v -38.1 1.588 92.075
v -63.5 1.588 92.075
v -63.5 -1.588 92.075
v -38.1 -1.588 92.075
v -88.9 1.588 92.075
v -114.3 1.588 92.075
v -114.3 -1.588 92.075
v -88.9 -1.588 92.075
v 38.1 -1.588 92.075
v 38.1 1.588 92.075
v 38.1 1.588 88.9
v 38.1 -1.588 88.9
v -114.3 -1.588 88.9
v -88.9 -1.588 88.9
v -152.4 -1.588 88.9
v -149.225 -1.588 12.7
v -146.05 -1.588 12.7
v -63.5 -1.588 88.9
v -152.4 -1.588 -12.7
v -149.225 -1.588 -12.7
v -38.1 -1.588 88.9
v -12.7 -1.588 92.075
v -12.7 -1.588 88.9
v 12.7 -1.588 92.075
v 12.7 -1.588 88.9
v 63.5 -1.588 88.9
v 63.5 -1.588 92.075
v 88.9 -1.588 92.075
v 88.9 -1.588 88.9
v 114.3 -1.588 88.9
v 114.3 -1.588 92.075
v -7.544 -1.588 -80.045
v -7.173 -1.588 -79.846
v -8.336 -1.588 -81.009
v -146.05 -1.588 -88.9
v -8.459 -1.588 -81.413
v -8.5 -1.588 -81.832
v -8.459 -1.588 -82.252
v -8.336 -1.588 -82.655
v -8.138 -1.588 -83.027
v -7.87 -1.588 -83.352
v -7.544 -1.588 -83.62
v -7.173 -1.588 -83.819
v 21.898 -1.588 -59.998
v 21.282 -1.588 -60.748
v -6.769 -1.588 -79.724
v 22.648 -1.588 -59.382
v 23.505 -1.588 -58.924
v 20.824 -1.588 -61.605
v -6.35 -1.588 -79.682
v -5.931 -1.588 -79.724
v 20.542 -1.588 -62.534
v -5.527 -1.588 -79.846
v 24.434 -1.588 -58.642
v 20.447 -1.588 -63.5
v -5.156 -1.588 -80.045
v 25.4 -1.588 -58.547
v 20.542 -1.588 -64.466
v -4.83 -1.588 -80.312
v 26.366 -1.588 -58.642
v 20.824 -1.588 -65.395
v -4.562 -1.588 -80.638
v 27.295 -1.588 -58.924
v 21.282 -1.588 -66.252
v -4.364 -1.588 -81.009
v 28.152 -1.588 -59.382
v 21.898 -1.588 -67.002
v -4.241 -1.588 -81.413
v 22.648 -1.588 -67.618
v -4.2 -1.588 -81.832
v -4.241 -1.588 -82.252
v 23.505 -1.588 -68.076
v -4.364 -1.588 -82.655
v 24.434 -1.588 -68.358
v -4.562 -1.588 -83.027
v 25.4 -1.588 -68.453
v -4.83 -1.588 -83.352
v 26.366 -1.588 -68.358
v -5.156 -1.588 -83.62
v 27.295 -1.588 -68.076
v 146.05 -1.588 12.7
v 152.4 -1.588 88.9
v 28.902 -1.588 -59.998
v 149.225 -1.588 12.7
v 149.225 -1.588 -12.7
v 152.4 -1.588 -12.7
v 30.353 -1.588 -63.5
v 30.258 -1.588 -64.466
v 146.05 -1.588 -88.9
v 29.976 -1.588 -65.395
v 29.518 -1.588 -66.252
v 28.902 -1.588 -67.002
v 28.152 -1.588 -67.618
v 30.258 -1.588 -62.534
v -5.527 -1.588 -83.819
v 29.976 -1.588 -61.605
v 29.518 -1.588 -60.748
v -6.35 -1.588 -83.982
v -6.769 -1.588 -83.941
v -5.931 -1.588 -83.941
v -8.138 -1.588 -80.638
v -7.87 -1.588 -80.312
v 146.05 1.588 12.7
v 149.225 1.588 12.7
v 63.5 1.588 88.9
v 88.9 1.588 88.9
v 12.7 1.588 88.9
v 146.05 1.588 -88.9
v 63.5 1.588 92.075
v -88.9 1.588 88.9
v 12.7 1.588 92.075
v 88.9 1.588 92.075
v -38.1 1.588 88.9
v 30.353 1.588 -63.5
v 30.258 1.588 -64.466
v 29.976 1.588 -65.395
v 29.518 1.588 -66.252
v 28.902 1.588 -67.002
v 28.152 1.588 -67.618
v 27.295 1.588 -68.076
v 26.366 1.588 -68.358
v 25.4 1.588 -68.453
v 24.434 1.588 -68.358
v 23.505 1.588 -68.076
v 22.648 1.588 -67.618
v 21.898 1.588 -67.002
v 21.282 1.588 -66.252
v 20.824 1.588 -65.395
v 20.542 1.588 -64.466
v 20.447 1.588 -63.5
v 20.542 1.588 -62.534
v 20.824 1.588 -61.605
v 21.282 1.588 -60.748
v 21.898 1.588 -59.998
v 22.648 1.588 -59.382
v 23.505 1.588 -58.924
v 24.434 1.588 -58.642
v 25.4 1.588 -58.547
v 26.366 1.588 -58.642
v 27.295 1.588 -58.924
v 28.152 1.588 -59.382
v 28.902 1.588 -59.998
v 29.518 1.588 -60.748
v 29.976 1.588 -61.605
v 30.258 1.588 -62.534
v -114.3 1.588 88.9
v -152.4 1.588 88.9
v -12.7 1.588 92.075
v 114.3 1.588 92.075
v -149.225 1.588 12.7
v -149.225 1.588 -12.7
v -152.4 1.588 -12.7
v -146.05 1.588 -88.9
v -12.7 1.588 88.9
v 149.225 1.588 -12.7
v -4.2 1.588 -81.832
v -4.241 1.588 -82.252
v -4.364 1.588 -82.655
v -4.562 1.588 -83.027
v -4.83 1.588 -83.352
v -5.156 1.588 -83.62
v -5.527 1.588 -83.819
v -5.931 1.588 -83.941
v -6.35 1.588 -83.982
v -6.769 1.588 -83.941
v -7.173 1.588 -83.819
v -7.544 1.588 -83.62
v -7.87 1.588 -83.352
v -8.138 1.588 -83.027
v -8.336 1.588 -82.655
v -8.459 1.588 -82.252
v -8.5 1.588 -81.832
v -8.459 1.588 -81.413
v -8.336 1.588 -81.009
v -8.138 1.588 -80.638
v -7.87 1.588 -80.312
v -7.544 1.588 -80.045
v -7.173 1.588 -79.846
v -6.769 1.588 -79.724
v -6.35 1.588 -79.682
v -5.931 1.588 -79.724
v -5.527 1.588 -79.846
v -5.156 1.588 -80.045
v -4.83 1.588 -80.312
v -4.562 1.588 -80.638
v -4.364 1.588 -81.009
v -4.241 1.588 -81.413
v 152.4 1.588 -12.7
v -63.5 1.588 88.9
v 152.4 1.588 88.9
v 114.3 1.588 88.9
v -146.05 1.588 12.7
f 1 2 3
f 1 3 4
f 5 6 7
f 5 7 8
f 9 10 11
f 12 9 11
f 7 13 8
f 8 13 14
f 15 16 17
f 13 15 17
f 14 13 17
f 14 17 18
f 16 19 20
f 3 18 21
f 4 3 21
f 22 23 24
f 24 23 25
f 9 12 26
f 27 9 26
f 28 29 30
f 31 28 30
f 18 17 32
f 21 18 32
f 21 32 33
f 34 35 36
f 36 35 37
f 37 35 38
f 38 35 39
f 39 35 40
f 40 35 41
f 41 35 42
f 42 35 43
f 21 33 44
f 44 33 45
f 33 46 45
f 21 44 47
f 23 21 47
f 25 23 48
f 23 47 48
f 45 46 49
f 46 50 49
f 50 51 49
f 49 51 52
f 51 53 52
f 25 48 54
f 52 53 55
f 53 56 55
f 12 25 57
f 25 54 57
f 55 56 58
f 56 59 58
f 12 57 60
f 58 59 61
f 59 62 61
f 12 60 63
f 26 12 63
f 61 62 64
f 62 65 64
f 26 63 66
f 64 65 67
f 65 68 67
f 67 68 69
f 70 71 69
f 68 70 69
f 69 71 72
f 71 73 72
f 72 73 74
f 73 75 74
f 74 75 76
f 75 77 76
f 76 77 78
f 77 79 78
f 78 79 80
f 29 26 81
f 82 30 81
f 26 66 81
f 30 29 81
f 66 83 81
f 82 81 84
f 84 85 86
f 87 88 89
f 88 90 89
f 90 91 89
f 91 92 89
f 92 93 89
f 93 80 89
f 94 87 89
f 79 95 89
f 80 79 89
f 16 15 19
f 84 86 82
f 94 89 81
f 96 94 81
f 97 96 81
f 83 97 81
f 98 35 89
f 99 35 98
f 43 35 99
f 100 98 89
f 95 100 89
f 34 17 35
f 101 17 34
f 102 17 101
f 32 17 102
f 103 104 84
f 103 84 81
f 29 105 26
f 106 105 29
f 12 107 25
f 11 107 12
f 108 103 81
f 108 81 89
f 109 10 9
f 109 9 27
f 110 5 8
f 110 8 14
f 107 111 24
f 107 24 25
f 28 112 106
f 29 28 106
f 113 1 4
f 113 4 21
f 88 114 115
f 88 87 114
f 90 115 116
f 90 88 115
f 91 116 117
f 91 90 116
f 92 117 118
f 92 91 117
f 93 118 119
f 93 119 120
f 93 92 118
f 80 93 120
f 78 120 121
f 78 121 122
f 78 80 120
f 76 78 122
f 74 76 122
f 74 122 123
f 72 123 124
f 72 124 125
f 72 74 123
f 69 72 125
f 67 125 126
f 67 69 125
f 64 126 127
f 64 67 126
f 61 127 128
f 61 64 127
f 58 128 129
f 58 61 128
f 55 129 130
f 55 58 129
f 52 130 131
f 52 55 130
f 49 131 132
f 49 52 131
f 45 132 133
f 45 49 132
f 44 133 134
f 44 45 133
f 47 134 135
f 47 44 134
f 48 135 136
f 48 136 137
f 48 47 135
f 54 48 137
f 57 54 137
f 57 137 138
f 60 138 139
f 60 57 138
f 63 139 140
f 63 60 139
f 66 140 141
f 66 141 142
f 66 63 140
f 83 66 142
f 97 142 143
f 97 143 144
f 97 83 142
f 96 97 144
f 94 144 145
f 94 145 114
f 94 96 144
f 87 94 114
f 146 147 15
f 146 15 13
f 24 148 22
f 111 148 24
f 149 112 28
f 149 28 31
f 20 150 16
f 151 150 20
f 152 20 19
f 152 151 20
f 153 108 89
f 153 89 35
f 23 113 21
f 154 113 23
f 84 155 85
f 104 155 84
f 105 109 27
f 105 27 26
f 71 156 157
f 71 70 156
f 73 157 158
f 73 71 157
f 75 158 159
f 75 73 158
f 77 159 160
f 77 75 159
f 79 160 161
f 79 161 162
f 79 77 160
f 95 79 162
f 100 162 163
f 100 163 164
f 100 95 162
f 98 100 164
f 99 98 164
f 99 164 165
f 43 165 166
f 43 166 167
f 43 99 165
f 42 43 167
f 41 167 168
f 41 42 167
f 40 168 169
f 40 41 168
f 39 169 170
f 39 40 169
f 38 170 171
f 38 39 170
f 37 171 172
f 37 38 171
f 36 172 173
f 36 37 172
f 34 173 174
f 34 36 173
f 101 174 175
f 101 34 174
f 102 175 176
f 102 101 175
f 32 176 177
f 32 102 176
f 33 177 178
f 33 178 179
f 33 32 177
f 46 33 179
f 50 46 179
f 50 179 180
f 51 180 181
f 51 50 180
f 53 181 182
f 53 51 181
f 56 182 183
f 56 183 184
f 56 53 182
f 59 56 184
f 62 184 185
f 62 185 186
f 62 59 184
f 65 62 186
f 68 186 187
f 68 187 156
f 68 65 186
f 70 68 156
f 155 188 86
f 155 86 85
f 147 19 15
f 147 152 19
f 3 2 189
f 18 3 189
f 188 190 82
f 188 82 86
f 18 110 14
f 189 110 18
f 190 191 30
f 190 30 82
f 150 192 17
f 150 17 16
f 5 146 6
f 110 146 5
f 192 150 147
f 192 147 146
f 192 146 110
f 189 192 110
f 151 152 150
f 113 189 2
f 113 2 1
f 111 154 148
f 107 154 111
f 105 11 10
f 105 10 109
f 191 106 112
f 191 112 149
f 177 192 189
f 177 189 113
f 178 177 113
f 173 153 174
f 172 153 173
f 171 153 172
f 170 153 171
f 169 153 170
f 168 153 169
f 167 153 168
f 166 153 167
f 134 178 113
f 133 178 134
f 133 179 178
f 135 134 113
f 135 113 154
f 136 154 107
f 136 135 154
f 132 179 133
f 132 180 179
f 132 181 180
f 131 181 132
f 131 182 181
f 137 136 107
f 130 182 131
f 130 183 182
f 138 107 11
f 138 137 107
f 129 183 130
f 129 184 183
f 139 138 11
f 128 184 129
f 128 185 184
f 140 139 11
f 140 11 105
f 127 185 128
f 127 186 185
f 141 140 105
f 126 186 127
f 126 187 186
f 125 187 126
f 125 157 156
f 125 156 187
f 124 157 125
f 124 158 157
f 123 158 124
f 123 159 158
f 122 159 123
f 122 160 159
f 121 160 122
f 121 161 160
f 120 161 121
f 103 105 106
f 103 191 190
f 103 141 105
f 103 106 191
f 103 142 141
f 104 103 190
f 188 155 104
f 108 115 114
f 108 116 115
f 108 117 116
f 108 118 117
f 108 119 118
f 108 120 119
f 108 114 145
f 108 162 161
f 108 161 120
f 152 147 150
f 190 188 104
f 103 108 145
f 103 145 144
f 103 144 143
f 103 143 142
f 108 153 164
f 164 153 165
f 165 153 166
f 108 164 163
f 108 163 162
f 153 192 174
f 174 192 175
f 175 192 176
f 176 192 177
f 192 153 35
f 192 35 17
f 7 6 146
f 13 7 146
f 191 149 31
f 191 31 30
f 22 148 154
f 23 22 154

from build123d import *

# Parameters (mm, degrees)
SKETCH1_R           = 2.15
SKETCH1_R_2         = 4.953
SKETCH1_W           = 25.4
SKETCH1_H           = 3.175
BOSS_EXTRUDE1_DEPTH = 1.5875


with BuildPart() as part:
    # Sketch1 → Boss-Extrude1 (new body, symmetric)
    with BuildSketch(Plane(origin=(0, 0, 0), x_dir=(1, 0, 0), z_dir=(0, 1, 0))):
        Polygon((-152.4, 12.7), (-152.4, -88.9), (-114.3, -88.9), (-88.9, -88.9), (-63.5, -88.9), (-38.1, -88.9), (-12.7, -88.9), (12.7, -88.9), (38.1, -88.9), (63.5, -88.9), (88.9, -88.9), (114.3, -88.9), (152.4, -88.9), (152.4, 12.7), (149.225, 12.7), (149.225, -12.7), (146.05, -12.7), (146.05, 88.9), (-146.05, 88.9), (-146.05, -12.7), (-149.225, -12.7), (-149.225, 12.7), align=None)
        with Locations((-6.35, 81.8322)):
            Circle(SKETCH1_R, mode=Mode.SUBTRACT)
        with Locations((25.4, 63.5)):
            Circle(SKETCH1_R_2, mode=Mode.SUBTRACT)
        with Locations((-101.6, -90.4875)):
            Rectangle(SKETCH1_W, SKETCH1_H)
        with Locations((-50.8, -90.4875)):
            Rectangle(SKETCH1_W, SKETCH1_H)
        with Locations((0, -90.4875)):
            Rectangle(SKETCH1_W, SKETCH1_H)
        with Locations((50.8, -90.4875)):
            Rectangle(SKETCH1_W, SKETCH1_H)
        with Locations((101.6, -90.4875)):
            Rectangle(SKETCH1_W, SKETCH1_H)
    extrude(amount=BOSS_EXTRUDE1_DEPTH, both=True)


solid = part.part
